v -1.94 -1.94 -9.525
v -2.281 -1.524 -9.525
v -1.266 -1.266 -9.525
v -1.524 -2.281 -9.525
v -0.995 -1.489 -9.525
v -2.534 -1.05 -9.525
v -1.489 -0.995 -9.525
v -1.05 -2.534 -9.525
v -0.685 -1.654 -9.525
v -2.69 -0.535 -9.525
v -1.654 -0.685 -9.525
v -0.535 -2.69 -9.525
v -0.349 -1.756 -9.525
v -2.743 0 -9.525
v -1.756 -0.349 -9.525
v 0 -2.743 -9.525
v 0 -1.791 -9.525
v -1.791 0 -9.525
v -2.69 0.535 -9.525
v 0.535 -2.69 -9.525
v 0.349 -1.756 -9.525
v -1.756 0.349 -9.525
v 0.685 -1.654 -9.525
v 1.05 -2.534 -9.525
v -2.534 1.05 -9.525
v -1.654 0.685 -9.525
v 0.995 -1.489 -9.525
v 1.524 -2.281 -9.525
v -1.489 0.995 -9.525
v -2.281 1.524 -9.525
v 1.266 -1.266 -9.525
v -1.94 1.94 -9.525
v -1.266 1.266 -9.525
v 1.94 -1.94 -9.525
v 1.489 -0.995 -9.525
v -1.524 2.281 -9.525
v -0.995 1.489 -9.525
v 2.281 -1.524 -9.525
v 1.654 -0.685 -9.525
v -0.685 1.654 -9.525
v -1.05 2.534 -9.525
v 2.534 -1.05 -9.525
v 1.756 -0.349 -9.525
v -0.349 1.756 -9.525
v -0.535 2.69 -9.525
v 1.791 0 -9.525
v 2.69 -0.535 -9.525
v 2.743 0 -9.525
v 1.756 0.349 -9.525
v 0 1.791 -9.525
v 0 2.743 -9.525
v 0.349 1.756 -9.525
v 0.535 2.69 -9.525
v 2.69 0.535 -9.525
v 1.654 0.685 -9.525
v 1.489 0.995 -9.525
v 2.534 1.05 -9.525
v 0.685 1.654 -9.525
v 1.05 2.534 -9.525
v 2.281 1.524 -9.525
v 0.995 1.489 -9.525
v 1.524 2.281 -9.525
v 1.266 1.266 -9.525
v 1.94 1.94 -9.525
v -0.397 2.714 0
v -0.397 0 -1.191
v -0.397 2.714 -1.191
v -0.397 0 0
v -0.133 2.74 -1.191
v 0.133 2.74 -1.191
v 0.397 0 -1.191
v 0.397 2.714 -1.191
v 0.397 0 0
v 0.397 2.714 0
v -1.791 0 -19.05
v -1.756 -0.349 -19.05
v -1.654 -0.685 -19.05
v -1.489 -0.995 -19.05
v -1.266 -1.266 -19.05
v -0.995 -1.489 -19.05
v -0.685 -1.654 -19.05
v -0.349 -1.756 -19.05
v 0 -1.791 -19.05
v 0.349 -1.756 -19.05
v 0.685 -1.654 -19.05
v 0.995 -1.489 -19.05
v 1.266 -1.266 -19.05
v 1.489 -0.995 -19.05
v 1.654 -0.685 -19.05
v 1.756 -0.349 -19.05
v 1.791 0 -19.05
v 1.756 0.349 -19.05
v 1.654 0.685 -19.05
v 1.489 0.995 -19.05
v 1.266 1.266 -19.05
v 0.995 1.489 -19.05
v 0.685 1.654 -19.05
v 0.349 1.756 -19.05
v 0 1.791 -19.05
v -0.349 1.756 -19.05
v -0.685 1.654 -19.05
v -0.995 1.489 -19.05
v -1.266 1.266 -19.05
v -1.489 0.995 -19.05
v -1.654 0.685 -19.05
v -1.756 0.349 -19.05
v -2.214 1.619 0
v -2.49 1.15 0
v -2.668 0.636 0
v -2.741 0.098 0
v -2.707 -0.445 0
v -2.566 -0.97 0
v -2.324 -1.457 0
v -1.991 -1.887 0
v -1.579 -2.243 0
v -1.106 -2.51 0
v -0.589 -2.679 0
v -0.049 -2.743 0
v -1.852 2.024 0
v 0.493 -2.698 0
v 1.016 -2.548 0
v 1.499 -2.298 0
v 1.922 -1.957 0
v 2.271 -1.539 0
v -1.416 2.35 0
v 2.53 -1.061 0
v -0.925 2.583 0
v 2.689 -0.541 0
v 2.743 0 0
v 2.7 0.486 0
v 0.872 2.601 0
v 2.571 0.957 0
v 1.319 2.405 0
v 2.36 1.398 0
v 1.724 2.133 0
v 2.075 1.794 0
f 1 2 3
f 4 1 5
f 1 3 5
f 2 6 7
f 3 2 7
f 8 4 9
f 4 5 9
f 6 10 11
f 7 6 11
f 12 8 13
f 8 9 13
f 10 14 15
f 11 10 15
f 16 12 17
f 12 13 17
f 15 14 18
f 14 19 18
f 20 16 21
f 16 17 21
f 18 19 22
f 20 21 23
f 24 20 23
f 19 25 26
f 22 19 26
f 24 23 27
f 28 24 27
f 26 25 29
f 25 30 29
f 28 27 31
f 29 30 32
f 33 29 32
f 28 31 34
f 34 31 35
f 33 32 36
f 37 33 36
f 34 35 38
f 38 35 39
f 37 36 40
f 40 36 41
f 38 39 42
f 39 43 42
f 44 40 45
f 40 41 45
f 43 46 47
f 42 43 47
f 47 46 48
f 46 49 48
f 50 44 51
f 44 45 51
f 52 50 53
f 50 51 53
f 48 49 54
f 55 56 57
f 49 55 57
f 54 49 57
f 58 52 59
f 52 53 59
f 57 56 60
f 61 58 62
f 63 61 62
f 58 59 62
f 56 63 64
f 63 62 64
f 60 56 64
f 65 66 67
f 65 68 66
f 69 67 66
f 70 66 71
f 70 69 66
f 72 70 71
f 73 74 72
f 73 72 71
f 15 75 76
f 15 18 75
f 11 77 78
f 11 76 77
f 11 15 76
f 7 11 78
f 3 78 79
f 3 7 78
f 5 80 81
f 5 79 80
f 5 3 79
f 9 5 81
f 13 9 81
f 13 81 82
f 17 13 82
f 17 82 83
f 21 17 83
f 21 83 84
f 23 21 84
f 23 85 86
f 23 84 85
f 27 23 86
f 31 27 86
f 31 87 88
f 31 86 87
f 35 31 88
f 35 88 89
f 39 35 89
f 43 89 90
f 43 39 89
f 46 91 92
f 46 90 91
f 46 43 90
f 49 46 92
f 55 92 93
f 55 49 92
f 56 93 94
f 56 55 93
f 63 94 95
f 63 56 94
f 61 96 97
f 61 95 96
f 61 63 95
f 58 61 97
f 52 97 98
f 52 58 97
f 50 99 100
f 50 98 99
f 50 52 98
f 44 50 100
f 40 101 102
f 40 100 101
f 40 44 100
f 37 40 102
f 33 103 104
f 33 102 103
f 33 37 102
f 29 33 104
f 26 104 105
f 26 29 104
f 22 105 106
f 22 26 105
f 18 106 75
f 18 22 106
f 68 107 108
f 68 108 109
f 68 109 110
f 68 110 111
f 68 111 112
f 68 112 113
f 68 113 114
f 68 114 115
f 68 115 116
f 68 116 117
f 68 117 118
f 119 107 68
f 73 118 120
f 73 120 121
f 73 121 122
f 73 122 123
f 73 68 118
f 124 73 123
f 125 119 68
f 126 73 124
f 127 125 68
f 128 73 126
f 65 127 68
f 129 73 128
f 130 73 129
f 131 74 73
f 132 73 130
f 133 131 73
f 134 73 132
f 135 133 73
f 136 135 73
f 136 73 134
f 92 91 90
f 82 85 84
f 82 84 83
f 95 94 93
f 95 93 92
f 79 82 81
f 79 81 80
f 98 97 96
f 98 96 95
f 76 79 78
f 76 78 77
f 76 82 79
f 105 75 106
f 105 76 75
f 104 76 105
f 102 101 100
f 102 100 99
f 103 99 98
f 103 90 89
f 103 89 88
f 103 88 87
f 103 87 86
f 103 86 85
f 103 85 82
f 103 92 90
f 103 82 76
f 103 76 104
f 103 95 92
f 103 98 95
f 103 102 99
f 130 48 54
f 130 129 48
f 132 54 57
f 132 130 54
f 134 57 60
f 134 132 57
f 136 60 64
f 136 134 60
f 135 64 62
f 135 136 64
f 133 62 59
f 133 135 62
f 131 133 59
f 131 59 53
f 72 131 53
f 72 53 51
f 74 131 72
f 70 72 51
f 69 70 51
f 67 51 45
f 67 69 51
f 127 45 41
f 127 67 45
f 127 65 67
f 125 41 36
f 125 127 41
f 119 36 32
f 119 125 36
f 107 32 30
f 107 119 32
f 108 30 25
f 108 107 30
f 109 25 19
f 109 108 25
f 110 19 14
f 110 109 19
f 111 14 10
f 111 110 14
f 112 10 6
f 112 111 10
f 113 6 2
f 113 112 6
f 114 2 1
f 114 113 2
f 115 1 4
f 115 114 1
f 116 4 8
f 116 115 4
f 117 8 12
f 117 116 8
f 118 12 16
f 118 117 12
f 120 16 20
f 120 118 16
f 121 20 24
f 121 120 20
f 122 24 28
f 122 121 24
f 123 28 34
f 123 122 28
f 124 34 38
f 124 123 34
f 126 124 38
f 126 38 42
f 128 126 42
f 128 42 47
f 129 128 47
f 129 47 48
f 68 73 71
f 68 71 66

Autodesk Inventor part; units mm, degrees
ref_plane "YZ Plane" through (0, 0, 0) normal (1, 0, 0) x (0, 1, 0)
ref_plane "XZ Plane" through (0, 0, 0) normal (0, 1, 0) x (-1, 0, 0)
ref_plane "XY Plane" through (0, 0, 0) normal (0, 0, 1) x (1, 0, 0)
sketch "Sketch1" plane through (0, 0, 0) normal (0, 0, 1) x (1, 0, 0)
  circle A0 centre (0, 0) radius 2.7432
  dimension "d0" = 5.4864
extrude "Extrusion1" add sketch "Sketch1" against normal blind 9.525
sketch "Sketch2" plane through (0, 0, -9.525) normal (0, 0, -1) x (-1, 0, 0)
  circle A0 centre (0, 0) radius 1.7907
  dimension "d3" = 3.5814
extrude "Extrusion2" add sketch "Sketch2" along normal blind 9.525
thread "Thread1" size "12-24 UNC" class "2A" standard "ANSI Unified Screw Threads" length 9.525 offset 1.1906
thread "Thread2" size "12-24 UNC" class "2A" standard "ANSI Unified Screw Threads" full length
sketch "Sketch3" plane through (0, 0, 0) normal (0, 0, 1) x (1, 0, 0)
  line L0 (0, 0) -> (0, 3.3215) construction
  line L1 (-0.3969, 2.772) -> (0.3969, 2.772)
  line L2 (0.3969, 2.772) -> (0.3969, 0)
  line L3 (0.3969, 0) -> (-0.3969, 0)
  line L4 (-0.3969, 0) -> (-0.3969, 2.772)
  dimension "d10" = 0.3969
  dimension "d11" = 0.7937
extrude "Extrusion3" cut sketch "Sketch3" against normal blind 1.1906
properties part number "VS-010 (SET SCREW)" material "Steel, Carbon"
